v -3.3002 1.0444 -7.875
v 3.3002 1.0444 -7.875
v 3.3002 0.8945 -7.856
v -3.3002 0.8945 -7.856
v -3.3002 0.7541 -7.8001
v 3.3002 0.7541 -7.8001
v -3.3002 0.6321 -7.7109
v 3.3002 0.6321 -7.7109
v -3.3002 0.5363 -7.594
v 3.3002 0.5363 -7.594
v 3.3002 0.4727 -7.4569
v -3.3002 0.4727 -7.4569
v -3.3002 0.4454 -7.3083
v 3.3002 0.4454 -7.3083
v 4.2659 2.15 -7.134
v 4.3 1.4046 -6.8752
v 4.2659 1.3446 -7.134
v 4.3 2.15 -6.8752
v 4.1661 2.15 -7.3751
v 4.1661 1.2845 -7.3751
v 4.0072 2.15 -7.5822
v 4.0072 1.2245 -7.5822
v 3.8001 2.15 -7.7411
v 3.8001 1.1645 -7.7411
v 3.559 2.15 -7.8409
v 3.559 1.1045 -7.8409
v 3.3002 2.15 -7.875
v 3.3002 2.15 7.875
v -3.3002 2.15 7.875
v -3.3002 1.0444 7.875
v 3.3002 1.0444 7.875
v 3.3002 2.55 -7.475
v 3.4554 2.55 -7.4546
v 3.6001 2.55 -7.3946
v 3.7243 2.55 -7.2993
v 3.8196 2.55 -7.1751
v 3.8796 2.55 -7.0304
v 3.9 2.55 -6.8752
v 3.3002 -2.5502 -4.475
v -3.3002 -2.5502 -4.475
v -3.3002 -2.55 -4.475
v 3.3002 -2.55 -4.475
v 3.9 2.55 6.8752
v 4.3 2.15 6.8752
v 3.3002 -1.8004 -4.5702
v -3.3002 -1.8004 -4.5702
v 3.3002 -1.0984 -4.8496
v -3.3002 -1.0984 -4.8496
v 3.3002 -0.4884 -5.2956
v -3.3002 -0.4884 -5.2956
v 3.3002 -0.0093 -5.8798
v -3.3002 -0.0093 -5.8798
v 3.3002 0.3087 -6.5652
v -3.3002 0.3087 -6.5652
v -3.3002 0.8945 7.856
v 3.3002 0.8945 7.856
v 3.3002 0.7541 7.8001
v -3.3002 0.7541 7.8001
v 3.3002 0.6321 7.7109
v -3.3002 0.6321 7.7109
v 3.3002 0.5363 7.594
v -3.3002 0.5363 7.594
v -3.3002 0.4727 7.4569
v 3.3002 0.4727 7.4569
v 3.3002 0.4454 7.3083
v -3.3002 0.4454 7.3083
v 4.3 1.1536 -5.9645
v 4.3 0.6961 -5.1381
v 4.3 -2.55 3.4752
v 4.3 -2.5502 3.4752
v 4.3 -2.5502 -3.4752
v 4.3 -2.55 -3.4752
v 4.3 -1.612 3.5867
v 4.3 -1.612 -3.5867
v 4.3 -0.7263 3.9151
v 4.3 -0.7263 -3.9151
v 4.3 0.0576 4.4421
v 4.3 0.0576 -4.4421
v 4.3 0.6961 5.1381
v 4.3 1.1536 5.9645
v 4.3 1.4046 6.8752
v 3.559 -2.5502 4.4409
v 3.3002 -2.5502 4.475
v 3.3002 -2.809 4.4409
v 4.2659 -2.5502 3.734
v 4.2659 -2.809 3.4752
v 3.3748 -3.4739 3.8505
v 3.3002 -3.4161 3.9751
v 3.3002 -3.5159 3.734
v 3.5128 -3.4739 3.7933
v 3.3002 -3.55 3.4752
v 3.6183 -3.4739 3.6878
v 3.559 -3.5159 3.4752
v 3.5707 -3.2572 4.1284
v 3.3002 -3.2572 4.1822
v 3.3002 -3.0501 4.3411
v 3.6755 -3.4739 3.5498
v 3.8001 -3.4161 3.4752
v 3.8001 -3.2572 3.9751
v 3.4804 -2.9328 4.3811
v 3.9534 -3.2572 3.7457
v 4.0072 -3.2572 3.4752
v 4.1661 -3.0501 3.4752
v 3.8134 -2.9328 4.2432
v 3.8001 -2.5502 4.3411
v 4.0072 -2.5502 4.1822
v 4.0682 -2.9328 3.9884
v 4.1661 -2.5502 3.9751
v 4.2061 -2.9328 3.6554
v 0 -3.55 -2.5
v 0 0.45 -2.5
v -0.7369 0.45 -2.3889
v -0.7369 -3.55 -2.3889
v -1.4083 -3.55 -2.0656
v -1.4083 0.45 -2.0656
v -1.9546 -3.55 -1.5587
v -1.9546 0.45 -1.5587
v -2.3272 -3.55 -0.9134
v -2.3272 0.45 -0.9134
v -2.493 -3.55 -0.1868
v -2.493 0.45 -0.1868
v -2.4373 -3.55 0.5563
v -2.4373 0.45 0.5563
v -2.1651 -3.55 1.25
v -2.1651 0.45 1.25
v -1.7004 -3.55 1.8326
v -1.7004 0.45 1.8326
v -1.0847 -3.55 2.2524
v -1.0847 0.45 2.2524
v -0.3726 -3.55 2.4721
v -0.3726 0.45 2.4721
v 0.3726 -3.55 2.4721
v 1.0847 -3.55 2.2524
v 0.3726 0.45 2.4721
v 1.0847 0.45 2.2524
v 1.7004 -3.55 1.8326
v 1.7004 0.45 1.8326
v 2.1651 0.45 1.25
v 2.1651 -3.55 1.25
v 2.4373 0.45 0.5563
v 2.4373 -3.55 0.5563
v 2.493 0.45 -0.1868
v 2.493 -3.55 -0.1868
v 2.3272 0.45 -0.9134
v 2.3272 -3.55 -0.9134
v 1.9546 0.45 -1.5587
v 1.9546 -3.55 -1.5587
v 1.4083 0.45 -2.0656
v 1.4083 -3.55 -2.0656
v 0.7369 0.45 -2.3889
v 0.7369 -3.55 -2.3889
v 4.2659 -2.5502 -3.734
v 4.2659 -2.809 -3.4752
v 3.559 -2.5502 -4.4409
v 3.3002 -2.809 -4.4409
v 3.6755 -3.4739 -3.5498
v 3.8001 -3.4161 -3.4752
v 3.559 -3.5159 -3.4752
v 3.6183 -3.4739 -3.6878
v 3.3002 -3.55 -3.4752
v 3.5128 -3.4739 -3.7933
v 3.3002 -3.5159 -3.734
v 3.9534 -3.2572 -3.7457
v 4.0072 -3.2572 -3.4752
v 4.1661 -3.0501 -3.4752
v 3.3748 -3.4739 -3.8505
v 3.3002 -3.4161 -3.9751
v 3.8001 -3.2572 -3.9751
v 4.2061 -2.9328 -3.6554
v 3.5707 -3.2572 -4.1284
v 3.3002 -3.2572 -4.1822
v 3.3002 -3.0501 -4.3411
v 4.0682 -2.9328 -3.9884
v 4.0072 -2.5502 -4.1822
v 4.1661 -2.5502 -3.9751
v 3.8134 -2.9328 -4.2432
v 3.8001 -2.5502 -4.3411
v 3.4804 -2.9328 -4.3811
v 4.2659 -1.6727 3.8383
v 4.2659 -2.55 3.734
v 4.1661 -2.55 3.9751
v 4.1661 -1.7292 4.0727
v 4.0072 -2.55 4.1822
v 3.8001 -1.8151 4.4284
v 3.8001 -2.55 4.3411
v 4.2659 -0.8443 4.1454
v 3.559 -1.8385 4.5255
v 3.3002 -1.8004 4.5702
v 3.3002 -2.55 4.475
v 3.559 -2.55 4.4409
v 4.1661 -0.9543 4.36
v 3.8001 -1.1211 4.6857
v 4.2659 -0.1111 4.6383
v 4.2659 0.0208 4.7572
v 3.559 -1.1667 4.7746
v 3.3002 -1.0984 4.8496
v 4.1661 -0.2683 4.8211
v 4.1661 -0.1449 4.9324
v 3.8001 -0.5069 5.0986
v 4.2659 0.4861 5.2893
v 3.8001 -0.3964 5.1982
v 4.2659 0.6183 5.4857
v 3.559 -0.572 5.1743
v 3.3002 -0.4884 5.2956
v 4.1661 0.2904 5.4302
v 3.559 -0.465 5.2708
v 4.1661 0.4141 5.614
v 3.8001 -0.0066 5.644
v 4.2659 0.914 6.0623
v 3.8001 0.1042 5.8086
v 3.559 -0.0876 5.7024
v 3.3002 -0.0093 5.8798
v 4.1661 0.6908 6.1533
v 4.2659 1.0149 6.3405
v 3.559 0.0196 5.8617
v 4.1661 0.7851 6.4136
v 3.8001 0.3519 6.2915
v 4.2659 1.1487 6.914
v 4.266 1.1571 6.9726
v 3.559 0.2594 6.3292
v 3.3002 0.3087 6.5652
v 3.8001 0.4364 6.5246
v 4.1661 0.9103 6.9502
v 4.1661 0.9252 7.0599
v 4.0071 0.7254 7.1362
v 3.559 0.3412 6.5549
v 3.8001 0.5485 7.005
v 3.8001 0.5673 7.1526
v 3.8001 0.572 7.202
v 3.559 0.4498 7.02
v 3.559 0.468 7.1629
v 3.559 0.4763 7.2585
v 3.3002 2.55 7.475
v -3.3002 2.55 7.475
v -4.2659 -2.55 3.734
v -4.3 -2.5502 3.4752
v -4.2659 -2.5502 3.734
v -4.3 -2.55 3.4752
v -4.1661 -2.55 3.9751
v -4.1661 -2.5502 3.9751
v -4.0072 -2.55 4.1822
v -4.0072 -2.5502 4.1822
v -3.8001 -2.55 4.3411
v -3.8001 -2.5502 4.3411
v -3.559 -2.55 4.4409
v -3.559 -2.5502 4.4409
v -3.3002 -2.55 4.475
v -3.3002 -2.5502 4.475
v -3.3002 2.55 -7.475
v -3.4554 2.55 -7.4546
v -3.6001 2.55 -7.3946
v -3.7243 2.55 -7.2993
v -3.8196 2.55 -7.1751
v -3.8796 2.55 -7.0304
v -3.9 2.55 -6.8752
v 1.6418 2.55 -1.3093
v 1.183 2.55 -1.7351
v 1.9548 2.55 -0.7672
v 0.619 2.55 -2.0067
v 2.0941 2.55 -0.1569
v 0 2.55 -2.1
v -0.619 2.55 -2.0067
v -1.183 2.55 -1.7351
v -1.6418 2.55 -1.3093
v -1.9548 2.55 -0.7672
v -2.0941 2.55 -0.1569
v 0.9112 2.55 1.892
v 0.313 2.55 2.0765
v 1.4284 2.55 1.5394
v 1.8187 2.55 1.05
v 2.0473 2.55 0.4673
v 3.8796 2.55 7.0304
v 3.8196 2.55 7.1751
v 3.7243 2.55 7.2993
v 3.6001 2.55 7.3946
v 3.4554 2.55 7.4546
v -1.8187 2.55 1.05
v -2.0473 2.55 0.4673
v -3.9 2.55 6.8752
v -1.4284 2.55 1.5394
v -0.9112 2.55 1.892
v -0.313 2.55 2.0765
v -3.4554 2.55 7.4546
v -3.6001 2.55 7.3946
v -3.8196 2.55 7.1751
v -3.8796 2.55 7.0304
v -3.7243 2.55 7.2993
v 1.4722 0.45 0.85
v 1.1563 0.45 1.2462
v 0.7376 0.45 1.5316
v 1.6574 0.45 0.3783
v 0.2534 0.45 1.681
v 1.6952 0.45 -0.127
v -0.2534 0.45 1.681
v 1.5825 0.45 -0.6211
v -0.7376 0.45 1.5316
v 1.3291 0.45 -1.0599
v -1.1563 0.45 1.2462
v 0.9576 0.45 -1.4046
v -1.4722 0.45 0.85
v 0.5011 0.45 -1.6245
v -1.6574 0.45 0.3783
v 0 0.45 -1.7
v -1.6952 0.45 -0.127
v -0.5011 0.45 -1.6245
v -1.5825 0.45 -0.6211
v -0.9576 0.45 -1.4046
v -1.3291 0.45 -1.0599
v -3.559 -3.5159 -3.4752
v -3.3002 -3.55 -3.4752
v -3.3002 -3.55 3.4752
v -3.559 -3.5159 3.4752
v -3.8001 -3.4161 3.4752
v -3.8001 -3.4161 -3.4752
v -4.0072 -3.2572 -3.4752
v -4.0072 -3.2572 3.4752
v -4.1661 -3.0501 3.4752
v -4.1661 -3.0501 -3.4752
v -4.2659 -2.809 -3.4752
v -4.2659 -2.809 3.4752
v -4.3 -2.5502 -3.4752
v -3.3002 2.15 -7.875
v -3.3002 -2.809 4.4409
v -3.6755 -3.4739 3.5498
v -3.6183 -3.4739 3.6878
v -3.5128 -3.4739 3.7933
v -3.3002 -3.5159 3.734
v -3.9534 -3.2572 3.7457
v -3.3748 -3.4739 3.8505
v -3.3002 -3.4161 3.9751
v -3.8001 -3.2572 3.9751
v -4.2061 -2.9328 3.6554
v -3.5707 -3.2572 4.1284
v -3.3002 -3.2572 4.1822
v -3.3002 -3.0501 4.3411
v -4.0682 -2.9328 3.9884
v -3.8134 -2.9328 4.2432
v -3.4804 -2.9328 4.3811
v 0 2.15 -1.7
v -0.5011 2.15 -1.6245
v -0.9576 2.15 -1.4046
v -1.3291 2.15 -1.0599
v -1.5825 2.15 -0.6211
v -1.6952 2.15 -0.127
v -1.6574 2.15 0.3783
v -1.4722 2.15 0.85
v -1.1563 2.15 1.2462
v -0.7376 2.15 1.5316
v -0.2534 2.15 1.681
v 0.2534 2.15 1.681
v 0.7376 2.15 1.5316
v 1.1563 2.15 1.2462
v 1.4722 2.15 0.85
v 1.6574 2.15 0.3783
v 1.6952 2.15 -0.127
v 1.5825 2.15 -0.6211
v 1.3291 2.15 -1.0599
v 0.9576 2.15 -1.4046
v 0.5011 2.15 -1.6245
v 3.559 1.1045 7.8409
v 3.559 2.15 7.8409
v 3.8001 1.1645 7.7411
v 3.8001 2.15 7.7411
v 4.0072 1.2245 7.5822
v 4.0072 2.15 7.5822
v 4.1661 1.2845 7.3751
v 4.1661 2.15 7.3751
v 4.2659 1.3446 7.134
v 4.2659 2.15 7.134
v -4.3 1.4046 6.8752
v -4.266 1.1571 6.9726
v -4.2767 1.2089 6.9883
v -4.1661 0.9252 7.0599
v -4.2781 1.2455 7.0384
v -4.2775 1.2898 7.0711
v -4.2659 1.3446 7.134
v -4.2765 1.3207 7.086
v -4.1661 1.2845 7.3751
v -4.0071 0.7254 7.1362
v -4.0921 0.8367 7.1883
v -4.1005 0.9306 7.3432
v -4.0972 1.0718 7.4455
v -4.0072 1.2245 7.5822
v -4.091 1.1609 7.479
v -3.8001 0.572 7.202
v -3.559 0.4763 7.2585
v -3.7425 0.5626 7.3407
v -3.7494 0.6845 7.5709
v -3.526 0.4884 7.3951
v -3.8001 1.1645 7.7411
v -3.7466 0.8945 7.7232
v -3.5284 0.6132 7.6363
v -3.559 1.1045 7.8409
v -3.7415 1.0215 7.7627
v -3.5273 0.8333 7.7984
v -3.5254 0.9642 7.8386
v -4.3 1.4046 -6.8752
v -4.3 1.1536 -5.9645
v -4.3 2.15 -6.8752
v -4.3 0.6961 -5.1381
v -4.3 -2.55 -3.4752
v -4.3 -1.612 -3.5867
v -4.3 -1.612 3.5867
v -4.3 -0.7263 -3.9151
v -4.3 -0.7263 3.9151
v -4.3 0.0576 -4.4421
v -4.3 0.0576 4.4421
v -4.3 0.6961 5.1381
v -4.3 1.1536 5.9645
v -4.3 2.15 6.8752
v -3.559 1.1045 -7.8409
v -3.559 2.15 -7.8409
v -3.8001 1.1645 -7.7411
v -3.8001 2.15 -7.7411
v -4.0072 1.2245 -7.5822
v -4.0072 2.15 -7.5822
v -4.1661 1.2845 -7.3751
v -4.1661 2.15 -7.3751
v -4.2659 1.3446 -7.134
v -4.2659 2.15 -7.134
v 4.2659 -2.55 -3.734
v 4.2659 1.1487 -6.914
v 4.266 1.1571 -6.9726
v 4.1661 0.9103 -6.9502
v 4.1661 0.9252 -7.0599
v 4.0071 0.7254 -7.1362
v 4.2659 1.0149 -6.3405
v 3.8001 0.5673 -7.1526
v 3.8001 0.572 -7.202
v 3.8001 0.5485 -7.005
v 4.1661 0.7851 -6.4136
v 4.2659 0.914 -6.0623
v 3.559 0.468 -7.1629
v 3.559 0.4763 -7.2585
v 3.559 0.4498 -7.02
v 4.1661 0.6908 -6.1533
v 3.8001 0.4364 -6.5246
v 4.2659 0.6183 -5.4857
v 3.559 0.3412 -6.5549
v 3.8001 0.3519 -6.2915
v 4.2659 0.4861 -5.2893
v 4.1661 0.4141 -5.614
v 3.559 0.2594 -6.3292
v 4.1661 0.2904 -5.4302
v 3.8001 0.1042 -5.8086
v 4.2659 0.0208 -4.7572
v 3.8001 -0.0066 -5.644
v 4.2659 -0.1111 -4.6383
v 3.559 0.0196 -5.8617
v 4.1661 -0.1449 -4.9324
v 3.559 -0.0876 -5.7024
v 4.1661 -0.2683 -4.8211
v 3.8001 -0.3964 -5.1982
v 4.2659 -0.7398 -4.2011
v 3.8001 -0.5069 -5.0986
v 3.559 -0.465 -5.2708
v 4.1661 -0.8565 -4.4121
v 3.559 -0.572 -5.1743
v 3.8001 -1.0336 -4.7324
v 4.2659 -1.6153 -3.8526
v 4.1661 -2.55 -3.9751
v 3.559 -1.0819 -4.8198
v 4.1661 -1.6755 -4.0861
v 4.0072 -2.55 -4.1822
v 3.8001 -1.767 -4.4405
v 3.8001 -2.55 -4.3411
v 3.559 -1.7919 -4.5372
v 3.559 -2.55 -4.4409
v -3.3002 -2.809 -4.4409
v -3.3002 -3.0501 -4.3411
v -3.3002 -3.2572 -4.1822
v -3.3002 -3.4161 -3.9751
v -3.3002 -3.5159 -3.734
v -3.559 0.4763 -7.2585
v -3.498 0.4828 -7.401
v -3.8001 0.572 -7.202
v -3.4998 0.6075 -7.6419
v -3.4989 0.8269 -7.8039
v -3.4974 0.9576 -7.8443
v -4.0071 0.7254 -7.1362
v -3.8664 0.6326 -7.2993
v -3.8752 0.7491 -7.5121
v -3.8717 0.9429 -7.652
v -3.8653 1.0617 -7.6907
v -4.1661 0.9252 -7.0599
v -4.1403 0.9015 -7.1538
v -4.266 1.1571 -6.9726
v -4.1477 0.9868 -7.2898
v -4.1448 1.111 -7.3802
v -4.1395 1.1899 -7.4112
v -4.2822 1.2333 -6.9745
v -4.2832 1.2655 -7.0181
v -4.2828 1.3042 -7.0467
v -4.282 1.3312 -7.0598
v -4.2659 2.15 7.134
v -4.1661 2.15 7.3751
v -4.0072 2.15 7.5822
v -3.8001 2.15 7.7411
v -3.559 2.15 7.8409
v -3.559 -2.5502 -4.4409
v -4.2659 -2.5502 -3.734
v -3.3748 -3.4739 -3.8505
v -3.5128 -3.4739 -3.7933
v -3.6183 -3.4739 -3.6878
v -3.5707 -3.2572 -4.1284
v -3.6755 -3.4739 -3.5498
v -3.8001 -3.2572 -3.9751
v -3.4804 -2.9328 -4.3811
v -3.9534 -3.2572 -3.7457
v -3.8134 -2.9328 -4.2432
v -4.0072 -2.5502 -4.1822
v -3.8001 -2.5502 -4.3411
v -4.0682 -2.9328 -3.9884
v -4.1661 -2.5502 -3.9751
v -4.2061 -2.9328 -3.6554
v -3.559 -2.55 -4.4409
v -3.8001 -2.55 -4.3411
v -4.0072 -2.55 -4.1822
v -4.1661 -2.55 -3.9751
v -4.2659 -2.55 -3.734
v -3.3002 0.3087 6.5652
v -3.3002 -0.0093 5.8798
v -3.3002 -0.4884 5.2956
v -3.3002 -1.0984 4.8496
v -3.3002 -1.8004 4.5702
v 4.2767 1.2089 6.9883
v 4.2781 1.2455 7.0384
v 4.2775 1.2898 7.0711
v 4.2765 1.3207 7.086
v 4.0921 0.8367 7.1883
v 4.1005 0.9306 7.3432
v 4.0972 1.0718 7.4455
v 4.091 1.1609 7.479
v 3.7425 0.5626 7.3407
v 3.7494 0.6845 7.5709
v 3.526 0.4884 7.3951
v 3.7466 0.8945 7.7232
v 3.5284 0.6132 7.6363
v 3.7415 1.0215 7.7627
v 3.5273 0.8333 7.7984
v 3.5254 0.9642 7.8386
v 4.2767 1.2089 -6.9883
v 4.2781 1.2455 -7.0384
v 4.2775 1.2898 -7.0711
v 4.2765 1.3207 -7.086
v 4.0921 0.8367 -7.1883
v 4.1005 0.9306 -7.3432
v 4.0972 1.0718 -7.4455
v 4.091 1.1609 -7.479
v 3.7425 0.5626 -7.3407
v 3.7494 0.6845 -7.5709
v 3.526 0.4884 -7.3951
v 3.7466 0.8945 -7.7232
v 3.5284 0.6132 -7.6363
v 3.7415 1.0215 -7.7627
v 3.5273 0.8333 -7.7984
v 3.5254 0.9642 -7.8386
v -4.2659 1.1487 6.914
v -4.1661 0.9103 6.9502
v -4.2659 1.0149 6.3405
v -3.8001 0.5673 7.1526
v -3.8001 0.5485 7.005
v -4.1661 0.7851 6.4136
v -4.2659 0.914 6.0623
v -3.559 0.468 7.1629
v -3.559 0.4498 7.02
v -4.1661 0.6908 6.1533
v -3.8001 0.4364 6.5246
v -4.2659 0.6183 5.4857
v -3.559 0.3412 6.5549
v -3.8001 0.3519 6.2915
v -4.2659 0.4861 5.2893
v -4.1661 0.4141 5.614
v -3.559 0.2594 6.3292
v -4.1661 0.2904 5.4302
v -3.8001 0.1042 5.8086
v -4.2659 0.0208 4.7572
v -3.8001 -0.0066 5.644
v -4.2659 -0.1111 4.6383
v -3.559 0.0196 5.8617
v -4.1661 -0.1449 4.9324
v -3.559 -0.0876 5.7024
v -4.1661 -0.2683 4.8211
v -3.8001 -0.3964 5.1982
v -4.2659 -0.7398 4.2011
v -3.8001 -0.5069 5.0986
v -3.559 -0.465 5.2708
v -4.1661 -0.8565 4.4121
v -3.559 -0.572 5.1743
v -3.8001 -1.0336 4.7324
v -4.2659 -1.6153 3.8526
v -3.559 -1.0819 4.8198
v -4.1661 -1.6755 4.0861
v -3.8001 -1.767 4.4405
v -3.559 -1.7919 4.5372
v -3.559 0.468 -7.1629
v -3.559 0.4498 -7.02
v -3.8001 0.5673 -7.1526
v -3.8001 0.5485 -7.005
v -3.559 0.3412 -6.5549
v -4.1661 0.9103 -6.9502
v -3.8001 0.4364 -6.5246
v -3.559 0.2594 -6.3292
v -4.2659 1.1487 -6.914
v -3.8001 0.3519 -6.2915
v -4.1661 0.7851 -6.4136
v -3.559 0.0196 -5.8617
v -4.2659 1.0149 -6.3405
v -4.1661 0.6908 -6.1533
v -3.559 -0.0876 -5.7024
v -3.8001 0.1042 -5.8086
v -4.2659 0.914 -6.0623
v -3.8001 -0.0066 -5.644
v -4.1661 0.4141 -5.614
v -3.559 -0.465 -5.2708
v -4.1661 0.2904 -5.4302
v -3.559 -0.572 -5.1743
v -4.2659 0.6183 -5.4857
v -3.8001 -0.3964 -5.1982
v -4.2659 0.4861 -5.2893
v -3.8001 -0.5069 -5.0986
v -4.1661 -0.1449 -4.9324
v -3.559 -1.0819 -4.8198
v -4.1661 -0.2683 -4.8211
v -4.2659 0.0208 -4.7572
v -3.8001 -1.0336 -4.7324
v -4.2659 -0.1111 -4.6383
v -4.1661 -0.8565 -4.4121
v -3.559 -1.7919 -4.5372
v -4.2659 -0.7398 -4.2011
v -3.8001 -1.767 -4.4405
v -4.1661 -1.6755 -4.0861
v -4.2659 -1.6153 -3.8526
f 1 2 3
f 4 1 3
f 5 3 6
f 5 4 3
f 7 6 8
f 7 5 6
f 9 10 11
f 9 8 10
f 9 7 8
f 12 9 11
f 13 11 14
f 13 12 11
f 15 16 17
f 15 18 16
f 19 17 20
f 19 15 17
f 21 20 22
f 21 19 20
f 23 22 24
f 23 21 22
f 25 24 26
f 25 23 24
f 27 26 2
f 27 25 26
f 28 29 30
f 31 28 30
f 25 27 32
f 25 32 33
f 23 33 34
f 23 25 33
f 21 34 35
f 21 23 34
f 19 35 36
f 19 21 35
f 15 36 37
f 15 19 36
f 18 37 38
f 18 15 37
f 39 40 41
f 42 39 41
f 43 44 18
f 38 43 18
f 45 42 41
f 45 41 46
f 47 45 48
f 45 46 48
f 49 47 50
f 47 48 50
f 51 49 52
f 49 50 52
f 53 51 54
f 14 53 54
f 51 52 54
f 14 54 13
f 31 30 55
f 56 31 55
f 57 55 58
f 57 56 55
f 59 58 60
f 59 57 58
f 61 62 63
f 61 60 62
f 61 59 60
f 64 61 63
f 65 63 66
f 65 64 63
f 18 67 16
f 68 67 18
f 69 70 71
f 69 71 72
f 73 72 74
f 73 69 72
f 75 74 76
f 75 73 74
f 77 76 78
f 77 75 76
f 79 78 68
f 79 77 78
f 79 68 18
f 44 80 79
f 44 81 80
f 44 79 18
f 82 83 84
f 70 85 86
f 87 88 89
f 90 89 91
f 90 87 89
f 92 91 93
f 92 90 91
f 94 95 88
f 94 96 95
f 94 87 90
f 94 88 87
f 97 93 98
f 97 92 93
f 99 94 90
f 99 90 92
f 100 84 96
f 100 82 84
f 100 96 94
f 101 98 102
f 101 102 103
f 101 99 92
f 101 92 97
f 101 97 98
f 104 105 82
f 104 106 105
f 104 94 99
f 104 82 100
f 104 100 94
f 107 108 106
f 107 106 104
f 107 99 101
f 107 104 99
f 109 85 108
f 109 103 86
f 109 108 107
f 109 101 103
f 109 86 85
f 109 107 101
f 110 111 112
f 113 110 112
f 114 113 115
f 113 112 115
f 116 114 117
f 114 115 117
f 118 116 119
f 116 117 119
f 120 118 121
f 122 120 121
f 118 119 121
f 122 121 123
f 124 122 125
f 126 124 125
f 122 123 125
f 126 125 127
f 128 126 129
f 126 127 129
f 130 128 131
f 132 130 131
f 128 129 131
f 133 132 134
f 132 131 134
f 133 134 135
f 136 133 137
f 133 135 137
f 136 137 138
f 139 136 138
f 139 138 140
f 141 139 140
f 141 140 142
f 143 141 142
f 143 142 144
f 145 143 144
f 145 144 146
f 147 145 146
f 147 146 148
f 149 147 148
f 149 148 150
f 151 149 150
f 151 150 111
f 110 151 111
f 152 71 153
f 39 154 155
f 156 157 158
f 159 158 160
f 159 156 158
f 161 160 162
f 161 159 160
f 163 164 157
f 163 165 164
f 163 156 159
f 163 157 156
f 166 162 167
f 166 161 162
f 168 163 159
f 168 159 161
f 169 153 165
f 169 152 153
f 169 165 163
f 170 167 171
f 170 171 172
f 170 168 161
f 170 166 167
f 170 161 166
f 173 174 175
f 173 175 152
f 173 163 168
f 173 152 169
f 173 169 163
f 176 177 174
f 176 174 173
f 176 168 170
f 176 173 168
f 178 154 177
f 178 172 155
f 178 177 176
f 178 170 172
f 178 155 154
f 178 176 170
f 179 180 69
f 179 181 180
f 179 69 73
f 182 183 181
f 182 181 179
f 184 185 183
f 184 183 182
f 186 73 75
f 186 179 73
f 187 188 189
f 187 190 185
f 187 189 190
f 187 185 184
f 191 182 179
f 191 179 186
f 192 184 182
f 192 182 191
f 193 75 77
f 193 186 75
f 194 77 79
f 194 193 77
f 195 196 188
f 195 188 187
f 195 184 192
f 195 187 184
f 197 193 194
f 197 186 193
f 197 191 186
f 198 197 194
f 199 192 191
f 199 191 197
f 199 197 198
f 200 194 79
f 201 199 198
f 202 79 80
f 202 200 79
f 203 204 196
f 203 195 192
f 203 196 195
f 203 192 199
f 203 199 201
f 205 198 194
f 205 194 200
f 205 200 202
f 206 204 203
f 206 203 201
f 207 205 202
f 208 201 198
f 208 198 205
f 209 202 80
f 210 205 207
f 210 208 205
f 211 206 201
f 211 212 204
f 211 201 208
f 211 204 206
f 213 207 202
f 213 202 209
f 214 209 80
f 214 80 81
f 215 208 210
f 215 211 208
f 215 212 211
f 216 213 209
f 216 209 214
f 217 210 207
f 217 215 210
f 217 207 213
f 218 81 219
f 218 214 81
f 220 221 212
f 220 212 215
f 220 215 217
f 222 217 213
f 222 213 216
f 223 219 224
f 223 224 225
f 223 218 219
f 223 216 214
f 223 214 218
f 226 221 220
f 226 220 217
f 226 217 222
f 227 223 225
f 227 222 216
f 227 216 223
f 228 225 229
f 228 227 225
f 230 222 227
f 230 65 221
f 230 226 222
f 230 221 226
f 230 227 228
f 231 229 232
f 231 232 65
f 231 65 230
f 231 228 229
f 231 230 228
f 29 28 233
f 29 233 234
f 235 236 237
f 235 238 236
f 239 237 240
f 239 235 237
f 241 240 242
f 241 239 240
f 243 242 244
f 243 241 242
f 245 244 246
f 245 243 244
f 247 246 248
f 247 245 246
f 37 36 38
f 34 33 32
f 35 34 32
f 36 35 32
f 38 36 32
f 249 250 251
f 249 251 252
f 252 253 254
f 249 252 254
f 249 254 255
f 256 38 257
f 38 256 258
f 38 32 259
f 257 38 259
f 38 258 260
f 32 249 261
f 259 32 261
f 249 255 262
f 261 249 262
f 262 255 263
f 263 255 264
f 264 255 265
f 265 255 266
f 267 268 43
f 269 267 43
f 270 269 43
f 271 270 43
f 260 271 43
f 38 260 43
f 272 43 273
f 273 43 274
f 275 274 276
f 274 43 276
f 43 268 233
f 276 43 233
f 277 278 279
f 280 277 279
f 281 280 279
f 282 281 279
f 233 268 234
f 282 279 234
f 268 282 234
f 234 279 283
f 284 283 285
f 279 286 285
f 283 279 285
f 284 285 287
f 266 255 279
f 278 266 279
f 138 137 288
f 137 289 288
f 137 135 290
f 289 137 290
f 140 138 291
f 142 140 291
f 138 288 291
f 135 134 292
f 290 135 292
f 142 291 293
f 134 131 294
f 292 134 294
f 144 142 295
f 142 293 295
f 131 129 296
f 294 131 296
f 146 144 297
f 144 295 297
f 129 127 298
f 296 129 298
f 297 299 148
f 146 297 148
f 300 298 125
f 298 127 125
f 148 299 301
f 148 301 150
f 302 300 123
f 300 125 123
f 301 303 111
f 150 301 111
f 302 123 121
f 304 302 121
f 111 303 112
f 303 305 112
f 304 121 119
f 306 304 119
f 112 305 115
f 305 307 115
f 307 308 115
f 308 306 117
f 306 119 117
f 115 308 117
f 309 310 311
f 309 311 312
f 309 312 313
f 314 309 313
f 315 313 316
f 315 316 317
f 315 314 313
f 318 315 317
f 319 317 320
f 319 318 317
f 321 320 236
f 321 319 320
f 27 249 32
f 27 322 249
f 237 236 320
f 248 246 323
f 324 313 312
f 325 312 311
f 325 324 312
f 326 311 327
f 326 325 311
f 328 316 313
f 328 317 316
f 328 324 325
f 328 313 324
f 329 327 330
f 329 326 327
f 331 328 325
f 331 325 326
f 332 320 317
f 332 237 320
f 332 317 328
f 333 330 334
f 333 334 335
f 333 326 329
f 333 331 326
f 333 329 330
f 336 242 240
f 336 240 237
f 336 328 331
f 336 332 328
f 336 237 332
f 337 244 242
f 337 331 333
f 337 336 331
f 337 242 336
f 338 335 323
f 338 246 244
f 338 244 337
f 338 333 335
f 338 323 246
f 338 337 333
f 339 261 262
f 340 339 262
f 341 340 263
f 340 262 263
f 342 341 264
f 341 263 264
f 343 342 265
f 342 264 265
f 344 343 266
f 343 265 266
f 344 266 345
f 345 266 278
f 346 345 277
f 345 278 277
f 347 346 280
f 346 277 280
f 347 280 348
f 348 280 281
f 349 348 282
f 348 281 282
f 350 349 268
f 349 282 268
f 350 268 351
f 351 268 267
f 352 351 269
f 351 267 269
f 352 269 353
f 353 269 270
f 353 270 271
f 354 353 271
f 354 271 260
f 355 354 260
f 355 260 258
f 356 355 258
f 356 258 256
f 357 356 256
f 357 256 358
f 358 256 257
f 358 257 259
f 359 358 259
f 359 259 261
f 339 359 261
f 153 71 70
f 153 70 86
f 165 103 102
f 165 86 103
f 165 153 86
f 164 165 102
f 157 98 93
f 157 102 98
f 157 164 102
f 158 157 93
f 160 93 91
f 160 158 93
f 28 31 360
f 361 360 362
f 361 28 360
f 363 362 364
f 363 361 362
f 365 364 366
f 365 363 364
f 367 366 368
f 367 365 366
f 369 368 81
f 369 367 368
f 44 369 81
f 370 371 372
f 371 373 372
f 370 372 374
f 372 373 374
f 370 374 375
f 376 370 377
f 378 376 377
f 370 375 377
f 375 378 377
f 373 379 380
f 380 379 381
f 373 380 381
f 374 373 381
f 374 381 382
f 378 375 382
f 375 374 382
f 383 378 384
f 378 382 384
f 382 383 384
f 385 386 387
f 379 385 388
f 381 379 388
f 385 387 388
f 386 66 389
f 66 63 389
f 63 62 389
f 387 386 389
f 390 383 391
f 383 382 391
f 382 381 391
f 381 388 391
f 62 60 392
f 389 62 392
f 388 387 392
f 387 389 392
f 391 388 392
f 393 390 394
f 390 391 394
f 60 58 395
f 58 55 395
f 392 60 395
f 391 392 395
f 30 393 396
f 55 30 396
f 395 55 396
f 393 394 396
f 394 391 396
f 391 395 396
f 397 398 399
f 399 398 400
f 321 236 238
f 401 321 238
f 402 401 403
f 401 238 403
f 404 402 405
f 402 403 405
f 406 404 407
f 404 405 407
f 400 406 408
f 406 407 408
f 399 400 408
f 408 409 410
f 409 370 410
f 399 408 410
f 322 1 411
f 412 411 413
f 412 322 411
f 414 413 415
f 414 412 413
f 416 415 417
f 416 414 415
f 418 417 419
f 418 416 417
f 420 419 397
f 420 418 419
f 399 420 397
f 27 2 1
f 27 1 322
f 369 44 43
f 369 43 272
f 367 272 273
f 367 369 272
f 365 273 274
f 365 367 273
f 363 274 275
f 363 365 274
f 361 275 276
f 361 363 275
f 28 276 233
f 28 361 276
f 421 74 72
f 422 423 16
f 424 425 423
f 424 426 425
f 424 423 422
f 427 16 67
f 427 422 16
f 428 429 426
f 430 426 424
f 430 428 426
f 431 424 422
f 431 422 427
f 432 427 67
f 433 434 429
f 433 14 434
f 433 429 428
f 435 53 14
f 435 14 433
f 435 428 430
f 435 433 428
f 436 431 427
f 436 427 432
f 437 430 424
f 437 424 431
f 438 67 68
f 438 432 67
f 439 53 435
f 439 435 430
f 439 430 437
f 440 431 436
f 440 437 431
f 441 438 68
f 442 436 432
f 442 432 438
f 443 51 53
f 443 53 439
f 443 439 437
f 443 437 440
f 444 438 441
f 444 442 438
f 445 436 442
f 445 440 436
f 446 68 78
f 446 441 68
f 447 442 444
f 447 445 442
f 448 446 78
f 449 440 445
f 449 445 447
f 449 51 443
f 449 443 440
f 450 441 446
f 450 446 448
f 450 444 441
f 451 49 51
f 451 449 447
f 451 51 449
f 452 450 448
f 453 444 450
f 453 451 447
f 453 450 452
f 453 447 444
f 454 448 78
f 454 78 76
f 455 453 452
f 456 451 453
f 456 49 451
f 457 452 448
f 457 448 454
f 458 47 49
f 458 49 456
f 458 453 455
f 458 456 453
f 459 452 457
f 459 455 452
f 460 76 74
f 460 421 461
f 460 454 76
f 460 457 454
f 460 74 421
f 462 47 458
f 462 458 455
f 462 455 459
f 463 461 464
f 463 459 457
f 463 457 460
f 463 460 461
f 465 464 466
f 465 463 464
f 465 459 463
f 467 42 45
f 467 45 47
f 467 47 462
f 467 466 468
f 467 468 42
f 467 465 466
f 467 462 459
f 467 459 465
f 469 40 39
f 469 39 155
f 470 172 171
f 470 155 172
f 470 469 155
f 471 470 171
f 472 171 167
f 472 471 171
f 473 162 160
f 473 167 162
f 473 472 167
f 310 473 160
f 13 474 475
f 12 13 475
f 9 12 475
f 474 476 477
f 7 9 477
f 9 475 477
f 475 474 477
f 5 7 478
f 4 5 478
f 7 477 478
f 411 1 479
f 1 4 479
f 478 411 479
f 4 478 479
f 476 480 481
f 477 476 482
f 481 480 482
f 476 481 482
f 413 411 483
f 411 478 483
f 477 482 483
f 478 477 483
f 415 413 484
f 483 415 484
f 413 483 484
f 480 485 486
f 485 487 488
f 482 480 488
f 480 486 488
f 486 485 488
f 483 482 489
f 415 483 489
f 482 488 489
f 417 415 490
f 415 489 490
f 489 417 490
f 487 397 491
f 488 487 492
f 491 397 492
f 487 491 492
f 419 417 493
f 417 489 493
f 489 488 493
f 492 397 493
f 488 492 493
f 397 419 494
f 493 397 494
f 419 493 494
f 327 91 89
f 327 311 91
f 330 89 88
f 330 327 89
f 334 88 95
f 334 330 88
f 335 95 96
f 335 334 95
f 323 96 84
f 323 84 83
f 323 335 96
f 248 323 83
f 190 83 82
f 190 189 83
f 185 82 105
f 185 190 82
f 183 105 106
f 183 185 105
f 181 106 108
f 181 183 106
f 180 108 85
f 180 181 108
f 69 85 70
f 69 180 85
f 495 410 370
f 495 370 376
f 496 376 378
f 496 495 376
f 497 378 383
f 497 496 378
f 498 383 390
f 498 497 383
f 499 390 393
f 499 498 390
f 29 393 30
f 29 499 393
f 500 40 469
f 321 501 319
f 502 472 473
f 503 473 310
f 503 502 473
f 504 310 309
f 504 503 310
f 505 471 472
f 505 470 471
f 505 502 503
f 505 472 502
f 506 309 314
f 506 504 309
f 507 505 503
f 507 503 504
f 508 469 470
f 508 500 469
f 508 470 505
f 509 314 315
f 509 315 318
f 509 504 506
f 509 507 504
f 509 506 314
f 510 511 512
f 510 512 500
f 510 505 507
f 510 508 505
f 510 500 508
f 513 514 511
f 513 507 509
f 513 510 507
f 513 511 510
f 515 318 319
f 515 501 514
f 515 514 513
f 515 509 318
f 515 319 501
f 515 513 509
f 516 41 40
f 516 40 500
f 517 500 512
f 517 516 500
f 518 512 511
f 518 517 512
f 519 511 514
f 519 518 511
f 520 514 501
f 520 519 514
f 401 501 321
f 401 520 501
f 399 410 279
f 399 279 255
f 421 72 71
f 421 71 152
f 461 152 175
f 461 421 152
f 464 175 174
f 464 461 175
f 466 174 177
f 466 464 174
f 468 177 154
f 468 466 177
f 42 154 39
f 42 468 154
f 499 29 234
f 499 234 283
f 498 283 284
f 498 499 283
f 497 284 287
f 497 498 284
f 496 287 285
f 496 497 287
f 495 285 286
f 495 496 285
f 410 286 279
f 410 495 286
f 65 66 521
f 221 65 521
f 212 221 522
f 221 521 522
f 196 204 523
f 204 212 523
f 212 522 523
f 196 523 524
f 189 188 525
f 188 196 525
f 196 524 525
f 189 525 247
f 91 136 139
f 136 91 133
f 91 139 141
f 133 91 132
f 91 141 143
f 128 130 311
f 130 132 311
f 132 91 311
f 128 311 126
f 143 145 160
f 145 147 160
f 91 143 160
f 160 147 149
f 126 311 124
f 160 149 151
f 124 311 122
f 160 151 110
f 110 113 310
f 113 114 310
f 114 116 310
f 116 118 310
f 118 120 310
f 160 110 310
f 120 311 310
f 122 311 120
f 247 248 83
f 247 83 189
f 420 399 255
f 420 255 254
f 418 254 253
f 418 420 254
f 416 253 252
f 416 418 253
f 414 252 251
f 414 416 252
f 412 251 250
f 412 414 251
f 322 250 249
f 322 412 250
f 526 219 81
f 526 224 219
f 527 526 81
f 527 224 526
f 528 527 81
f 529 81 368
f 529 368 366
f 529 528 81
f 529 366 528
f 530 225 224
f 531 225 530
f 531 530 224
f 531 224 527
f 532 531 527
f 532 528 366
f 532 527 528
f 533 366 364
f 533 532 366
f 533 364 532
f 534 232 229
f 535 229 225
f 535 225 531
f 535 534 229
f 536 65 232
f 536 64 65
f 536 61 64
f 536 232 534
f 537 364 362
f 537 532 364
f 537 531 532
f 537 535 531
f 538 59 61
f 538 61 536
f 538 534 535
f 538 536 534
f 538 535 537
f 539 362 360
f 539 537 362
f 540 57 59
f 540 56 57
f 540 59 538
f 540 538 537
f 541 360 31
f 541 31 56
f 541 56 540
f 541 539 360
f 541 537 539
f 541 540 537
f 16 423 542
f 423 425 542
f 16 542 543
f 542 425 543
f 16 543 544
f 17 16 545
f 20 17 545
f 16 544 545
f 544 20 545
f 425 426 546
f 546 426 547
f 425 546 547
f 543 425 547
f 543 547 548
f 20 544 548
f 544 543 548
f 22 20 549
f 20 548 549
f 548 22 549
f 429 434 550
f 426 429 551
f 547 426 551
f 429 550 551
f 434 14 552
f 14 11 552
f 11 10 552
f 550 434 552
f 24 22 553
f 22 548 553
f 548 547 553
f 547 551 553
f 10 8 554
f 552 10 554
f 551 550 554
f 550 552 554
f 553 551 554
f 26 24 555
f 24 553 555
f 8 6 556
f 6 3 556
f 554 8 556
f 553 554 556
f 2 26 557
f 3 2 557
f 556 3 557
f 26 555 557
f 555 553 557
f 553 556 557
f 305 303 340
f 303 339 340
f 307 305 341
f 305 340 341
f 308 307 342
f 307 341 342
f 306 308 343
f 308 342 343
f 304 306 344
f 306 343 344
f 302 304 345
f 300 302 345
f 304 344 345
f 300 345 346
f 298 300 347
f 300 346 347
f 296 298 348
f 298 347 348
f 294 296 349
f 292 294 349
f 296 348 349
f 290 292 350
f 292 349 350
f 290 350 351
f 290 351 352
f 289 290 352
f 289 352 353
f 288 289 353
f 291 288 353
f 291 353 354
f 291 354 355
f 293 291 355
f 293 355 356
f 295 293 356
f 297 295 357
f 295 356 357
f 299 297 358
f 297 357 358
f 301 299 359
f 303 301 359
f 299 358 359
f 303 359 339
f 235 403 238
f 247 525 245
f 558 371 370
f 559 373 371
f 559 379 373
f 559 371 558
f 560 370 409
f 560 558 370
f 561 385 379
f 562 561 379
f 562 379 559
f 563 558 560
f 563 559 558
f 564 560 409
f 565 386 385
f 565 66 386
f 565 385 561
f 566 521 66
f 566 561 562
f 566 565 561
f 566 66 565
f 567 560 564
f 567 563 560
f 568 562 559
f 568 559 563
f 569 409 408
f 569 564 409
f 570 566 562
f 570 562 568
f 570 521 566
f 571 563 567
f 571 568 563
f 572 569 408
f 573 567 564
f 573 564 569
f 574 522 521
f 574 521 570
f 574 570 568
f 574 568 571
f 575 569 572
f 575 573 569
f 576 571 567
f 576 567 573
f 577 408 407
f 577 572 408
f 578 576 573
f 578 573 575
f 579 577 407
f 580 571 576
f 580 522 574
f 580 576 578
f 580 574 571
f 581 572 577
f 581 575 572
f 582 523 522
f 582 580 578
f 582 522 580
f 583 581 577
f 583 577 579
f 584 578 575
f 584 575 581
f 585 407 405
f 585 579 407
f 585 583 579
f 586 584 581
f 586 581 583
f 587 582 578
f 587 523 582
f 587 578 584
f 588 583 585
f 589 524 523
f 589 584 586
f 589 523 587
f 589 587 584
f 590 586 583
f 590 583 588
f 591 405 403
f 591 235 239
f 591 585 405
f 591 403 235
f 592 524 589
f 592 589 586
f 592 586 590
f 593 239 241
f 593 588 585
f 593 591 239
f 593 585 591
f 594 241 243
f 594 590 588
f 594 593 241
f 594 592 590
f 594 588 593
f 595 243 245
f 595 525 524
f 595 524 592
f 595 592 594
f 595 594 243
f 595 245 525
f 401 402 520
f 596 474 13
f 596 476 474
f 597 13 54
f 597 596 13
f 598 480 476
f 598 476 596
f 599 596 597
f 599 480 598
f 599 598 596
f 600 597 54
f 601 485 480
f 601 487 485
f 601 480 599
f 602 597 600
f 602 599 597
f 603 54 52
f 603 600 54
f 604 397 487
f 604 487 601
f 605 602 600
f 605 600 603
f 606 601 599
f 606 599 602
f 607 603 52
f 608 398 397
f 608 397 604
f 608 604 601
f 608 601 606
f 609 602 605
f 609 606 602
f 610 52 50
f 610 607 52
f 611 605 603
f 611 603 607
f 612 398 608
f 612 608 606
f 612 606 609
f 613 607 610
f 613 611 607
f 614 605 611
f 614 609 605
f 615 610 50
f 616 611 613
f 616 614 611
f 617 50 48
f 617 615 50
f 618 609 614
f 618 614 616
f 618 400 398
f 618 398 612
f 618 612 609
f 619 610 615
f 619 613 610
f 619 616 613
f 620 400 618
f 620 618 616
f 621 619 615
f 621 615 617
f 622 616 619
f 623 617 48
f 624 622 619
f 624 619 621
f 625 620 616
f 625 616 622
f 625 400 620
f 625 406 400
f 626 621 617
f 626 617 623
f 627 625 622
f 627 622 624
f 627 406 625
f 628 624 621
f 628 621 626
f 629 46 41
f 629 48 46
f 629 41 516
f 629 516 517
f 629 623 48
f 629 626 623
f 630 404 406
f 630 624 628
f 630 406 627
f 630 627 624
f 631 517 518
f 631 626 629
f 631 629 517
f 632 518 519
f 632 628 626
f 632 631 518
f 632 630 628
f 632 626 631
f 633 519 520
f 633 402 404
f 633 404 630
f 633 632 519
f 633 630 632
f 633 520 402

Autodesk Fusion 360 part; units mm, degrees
sketch "Sketch1" plane through (0, 0, 0) normal (0, 1, 0) x (1, 0, 0) in component "[a]_belt_clamp_x2"
  line L0 (4.25, 7.875) -> (-4.25, 7.875)
  line L1 (-4.25, 7.875) -> (-4.25, -7.875)
  line L2 (-4.25, -7.875) -> (4.25, -7.875)
  line L3 (4.25, -7.875) -> (4.25, 7.875)
  line L4 (4.25, 7.875) -> (-4.25, -7.875) construction
  line L5 (-4.25, 7.875) -> (4.25, -7.875) construction
  dimension "d1" = 8.5
  dimension "d2" = 15.75
sketch "Sketch2" plane through (0, 0, 0) normal (1, 0, 0) x (0, 1, 0) in component "[a]_belt_clamp_x2"
  line L0 (2.55, 7.875) -> (-3.55, 7.875)
  line L1 (-3.55, 7.875) -> (-3.55, -7.875)
  line L2 (-3.55, -7.875) -> (2.55, -7.875)
  line L3 (2.55, -7.875) -> (2.55, 7.875)
  line L4 (2.55, 7.875) -> (-3.55, -7.875) construction
  line L5 (-3.55, 7.875) -> (2.55, -7.875) construction
  line L6 (-3.55, 4.475) -> (-2.55, 4.475)
  line L7 (0.45, 7.475) -> (0.45, 7.875)
  arc A0 (-2.55, 4.475) -> (0.45, 7.475) centre (-2.55, 7.475) ccw
  line L8 (0, 0) -> (-7.5, 0) construction
  line L9 (-3.55, -4.475) -> (-2.55, -4.475)
  arc A1 (0.45, -7.475) -> (-2.55, -4.475) centre (-2.55, -7.475) ccw
  line L10 (0.45, -7.475) -> (0.45, -7.875)
  point P0 (-0.5, 0)
  dimension "d8" = 6.1
  dimension "d9" = 15.75
  dimension "d10" = 3
  dimension "d11" = 3.4
  dimension "d12" = 3
  dimension "d13" = 1
extrude "Extrude2" add sketch "Sketch2" along normal mid plane 8.6 contours L0 L1 L2 L3 L6 L7 A0 L9 A1 L10 in component "[a]_belt_clamp_x2"
fillet "Fillet1" radius 0.6 2 edges at (0, 0.45, 7.875) (0, 0.45, -7.875) in component "[a]_belt_clamp_x2"
fillet "Fillet2" radius 1 20 edges at (-4.3, -3.05, 4.475) (-4.3, -0.4884, 5.2956) (-4.3, 0.6321, 7.7109) (-4.3, 1.7972, 7.875) (4.3, -3.05, 4.475) (4.3, -0.4884, 5.2956) (4.3, 0.6321, 7.7109) (4.3, 1.7972, 7.875) (-4.3, 1.7972, -7.875) (-4.3, 0.6321, -7.7109) (-4.3, -0.4884, -5.2956) (-4.3, -3.05, -4.475) (4.3, -3.05, -4.475) (4.3, -0.4884, -5.2956) (4.3, 0.6321, -7.7109) (4.3, 1.7972, -7.875) (0, -3.55, 4.475) (-4.3, -3.55, 0) (0, -3.55, -4.475) (4.3, -3.55, 0) in component "[a]_belt_clamp_x2"
hole "Hole1" at (0, -3.55, 0) direction (0, 1, 0) diameter 5 depth 4 tip angle 180 in component "[a]_belt_clamp_x2"
hole "Hole2" at (0, 0.45, 0) direction (0, 1, 0) diameter 3.4 end through all in component "[a]_belt_clamp_x2"
chamfer "Chamfer1" distance 0.4 angle 45 9 edges at (4.0071, 2.55, 7.5821) (0, 2.55, 7.875) (-4.0071, 2.55, 7.5821) (-4.3, 2.55, 0) (-4.0071, 2.55, -7.5821) (0, 2.55, -7.875) (4.0071, 2.55, -7.5821) (4.3, 2.55, 0) (-0.6147, 2.55, 1.585) in component "[a]_belt_clamp_x2"
component "[a]_belt_clamp_x2" placed x (1, 0, 0) y (0, 1, 0) z (0, 0, 1) at (0, 0, 0)
equation "d2 = ab_belt_width * 2 + 3.75 mm"
equation "ab_belt_width = 6 mm"
equation "d9 = ab_belt_width * 2 + 3.75 mm"
equation "d21 = ( 2.5 * 2 ) * 1 mm"
equation "d24 = ( 1.7 * 2 ) * 1 mm"
